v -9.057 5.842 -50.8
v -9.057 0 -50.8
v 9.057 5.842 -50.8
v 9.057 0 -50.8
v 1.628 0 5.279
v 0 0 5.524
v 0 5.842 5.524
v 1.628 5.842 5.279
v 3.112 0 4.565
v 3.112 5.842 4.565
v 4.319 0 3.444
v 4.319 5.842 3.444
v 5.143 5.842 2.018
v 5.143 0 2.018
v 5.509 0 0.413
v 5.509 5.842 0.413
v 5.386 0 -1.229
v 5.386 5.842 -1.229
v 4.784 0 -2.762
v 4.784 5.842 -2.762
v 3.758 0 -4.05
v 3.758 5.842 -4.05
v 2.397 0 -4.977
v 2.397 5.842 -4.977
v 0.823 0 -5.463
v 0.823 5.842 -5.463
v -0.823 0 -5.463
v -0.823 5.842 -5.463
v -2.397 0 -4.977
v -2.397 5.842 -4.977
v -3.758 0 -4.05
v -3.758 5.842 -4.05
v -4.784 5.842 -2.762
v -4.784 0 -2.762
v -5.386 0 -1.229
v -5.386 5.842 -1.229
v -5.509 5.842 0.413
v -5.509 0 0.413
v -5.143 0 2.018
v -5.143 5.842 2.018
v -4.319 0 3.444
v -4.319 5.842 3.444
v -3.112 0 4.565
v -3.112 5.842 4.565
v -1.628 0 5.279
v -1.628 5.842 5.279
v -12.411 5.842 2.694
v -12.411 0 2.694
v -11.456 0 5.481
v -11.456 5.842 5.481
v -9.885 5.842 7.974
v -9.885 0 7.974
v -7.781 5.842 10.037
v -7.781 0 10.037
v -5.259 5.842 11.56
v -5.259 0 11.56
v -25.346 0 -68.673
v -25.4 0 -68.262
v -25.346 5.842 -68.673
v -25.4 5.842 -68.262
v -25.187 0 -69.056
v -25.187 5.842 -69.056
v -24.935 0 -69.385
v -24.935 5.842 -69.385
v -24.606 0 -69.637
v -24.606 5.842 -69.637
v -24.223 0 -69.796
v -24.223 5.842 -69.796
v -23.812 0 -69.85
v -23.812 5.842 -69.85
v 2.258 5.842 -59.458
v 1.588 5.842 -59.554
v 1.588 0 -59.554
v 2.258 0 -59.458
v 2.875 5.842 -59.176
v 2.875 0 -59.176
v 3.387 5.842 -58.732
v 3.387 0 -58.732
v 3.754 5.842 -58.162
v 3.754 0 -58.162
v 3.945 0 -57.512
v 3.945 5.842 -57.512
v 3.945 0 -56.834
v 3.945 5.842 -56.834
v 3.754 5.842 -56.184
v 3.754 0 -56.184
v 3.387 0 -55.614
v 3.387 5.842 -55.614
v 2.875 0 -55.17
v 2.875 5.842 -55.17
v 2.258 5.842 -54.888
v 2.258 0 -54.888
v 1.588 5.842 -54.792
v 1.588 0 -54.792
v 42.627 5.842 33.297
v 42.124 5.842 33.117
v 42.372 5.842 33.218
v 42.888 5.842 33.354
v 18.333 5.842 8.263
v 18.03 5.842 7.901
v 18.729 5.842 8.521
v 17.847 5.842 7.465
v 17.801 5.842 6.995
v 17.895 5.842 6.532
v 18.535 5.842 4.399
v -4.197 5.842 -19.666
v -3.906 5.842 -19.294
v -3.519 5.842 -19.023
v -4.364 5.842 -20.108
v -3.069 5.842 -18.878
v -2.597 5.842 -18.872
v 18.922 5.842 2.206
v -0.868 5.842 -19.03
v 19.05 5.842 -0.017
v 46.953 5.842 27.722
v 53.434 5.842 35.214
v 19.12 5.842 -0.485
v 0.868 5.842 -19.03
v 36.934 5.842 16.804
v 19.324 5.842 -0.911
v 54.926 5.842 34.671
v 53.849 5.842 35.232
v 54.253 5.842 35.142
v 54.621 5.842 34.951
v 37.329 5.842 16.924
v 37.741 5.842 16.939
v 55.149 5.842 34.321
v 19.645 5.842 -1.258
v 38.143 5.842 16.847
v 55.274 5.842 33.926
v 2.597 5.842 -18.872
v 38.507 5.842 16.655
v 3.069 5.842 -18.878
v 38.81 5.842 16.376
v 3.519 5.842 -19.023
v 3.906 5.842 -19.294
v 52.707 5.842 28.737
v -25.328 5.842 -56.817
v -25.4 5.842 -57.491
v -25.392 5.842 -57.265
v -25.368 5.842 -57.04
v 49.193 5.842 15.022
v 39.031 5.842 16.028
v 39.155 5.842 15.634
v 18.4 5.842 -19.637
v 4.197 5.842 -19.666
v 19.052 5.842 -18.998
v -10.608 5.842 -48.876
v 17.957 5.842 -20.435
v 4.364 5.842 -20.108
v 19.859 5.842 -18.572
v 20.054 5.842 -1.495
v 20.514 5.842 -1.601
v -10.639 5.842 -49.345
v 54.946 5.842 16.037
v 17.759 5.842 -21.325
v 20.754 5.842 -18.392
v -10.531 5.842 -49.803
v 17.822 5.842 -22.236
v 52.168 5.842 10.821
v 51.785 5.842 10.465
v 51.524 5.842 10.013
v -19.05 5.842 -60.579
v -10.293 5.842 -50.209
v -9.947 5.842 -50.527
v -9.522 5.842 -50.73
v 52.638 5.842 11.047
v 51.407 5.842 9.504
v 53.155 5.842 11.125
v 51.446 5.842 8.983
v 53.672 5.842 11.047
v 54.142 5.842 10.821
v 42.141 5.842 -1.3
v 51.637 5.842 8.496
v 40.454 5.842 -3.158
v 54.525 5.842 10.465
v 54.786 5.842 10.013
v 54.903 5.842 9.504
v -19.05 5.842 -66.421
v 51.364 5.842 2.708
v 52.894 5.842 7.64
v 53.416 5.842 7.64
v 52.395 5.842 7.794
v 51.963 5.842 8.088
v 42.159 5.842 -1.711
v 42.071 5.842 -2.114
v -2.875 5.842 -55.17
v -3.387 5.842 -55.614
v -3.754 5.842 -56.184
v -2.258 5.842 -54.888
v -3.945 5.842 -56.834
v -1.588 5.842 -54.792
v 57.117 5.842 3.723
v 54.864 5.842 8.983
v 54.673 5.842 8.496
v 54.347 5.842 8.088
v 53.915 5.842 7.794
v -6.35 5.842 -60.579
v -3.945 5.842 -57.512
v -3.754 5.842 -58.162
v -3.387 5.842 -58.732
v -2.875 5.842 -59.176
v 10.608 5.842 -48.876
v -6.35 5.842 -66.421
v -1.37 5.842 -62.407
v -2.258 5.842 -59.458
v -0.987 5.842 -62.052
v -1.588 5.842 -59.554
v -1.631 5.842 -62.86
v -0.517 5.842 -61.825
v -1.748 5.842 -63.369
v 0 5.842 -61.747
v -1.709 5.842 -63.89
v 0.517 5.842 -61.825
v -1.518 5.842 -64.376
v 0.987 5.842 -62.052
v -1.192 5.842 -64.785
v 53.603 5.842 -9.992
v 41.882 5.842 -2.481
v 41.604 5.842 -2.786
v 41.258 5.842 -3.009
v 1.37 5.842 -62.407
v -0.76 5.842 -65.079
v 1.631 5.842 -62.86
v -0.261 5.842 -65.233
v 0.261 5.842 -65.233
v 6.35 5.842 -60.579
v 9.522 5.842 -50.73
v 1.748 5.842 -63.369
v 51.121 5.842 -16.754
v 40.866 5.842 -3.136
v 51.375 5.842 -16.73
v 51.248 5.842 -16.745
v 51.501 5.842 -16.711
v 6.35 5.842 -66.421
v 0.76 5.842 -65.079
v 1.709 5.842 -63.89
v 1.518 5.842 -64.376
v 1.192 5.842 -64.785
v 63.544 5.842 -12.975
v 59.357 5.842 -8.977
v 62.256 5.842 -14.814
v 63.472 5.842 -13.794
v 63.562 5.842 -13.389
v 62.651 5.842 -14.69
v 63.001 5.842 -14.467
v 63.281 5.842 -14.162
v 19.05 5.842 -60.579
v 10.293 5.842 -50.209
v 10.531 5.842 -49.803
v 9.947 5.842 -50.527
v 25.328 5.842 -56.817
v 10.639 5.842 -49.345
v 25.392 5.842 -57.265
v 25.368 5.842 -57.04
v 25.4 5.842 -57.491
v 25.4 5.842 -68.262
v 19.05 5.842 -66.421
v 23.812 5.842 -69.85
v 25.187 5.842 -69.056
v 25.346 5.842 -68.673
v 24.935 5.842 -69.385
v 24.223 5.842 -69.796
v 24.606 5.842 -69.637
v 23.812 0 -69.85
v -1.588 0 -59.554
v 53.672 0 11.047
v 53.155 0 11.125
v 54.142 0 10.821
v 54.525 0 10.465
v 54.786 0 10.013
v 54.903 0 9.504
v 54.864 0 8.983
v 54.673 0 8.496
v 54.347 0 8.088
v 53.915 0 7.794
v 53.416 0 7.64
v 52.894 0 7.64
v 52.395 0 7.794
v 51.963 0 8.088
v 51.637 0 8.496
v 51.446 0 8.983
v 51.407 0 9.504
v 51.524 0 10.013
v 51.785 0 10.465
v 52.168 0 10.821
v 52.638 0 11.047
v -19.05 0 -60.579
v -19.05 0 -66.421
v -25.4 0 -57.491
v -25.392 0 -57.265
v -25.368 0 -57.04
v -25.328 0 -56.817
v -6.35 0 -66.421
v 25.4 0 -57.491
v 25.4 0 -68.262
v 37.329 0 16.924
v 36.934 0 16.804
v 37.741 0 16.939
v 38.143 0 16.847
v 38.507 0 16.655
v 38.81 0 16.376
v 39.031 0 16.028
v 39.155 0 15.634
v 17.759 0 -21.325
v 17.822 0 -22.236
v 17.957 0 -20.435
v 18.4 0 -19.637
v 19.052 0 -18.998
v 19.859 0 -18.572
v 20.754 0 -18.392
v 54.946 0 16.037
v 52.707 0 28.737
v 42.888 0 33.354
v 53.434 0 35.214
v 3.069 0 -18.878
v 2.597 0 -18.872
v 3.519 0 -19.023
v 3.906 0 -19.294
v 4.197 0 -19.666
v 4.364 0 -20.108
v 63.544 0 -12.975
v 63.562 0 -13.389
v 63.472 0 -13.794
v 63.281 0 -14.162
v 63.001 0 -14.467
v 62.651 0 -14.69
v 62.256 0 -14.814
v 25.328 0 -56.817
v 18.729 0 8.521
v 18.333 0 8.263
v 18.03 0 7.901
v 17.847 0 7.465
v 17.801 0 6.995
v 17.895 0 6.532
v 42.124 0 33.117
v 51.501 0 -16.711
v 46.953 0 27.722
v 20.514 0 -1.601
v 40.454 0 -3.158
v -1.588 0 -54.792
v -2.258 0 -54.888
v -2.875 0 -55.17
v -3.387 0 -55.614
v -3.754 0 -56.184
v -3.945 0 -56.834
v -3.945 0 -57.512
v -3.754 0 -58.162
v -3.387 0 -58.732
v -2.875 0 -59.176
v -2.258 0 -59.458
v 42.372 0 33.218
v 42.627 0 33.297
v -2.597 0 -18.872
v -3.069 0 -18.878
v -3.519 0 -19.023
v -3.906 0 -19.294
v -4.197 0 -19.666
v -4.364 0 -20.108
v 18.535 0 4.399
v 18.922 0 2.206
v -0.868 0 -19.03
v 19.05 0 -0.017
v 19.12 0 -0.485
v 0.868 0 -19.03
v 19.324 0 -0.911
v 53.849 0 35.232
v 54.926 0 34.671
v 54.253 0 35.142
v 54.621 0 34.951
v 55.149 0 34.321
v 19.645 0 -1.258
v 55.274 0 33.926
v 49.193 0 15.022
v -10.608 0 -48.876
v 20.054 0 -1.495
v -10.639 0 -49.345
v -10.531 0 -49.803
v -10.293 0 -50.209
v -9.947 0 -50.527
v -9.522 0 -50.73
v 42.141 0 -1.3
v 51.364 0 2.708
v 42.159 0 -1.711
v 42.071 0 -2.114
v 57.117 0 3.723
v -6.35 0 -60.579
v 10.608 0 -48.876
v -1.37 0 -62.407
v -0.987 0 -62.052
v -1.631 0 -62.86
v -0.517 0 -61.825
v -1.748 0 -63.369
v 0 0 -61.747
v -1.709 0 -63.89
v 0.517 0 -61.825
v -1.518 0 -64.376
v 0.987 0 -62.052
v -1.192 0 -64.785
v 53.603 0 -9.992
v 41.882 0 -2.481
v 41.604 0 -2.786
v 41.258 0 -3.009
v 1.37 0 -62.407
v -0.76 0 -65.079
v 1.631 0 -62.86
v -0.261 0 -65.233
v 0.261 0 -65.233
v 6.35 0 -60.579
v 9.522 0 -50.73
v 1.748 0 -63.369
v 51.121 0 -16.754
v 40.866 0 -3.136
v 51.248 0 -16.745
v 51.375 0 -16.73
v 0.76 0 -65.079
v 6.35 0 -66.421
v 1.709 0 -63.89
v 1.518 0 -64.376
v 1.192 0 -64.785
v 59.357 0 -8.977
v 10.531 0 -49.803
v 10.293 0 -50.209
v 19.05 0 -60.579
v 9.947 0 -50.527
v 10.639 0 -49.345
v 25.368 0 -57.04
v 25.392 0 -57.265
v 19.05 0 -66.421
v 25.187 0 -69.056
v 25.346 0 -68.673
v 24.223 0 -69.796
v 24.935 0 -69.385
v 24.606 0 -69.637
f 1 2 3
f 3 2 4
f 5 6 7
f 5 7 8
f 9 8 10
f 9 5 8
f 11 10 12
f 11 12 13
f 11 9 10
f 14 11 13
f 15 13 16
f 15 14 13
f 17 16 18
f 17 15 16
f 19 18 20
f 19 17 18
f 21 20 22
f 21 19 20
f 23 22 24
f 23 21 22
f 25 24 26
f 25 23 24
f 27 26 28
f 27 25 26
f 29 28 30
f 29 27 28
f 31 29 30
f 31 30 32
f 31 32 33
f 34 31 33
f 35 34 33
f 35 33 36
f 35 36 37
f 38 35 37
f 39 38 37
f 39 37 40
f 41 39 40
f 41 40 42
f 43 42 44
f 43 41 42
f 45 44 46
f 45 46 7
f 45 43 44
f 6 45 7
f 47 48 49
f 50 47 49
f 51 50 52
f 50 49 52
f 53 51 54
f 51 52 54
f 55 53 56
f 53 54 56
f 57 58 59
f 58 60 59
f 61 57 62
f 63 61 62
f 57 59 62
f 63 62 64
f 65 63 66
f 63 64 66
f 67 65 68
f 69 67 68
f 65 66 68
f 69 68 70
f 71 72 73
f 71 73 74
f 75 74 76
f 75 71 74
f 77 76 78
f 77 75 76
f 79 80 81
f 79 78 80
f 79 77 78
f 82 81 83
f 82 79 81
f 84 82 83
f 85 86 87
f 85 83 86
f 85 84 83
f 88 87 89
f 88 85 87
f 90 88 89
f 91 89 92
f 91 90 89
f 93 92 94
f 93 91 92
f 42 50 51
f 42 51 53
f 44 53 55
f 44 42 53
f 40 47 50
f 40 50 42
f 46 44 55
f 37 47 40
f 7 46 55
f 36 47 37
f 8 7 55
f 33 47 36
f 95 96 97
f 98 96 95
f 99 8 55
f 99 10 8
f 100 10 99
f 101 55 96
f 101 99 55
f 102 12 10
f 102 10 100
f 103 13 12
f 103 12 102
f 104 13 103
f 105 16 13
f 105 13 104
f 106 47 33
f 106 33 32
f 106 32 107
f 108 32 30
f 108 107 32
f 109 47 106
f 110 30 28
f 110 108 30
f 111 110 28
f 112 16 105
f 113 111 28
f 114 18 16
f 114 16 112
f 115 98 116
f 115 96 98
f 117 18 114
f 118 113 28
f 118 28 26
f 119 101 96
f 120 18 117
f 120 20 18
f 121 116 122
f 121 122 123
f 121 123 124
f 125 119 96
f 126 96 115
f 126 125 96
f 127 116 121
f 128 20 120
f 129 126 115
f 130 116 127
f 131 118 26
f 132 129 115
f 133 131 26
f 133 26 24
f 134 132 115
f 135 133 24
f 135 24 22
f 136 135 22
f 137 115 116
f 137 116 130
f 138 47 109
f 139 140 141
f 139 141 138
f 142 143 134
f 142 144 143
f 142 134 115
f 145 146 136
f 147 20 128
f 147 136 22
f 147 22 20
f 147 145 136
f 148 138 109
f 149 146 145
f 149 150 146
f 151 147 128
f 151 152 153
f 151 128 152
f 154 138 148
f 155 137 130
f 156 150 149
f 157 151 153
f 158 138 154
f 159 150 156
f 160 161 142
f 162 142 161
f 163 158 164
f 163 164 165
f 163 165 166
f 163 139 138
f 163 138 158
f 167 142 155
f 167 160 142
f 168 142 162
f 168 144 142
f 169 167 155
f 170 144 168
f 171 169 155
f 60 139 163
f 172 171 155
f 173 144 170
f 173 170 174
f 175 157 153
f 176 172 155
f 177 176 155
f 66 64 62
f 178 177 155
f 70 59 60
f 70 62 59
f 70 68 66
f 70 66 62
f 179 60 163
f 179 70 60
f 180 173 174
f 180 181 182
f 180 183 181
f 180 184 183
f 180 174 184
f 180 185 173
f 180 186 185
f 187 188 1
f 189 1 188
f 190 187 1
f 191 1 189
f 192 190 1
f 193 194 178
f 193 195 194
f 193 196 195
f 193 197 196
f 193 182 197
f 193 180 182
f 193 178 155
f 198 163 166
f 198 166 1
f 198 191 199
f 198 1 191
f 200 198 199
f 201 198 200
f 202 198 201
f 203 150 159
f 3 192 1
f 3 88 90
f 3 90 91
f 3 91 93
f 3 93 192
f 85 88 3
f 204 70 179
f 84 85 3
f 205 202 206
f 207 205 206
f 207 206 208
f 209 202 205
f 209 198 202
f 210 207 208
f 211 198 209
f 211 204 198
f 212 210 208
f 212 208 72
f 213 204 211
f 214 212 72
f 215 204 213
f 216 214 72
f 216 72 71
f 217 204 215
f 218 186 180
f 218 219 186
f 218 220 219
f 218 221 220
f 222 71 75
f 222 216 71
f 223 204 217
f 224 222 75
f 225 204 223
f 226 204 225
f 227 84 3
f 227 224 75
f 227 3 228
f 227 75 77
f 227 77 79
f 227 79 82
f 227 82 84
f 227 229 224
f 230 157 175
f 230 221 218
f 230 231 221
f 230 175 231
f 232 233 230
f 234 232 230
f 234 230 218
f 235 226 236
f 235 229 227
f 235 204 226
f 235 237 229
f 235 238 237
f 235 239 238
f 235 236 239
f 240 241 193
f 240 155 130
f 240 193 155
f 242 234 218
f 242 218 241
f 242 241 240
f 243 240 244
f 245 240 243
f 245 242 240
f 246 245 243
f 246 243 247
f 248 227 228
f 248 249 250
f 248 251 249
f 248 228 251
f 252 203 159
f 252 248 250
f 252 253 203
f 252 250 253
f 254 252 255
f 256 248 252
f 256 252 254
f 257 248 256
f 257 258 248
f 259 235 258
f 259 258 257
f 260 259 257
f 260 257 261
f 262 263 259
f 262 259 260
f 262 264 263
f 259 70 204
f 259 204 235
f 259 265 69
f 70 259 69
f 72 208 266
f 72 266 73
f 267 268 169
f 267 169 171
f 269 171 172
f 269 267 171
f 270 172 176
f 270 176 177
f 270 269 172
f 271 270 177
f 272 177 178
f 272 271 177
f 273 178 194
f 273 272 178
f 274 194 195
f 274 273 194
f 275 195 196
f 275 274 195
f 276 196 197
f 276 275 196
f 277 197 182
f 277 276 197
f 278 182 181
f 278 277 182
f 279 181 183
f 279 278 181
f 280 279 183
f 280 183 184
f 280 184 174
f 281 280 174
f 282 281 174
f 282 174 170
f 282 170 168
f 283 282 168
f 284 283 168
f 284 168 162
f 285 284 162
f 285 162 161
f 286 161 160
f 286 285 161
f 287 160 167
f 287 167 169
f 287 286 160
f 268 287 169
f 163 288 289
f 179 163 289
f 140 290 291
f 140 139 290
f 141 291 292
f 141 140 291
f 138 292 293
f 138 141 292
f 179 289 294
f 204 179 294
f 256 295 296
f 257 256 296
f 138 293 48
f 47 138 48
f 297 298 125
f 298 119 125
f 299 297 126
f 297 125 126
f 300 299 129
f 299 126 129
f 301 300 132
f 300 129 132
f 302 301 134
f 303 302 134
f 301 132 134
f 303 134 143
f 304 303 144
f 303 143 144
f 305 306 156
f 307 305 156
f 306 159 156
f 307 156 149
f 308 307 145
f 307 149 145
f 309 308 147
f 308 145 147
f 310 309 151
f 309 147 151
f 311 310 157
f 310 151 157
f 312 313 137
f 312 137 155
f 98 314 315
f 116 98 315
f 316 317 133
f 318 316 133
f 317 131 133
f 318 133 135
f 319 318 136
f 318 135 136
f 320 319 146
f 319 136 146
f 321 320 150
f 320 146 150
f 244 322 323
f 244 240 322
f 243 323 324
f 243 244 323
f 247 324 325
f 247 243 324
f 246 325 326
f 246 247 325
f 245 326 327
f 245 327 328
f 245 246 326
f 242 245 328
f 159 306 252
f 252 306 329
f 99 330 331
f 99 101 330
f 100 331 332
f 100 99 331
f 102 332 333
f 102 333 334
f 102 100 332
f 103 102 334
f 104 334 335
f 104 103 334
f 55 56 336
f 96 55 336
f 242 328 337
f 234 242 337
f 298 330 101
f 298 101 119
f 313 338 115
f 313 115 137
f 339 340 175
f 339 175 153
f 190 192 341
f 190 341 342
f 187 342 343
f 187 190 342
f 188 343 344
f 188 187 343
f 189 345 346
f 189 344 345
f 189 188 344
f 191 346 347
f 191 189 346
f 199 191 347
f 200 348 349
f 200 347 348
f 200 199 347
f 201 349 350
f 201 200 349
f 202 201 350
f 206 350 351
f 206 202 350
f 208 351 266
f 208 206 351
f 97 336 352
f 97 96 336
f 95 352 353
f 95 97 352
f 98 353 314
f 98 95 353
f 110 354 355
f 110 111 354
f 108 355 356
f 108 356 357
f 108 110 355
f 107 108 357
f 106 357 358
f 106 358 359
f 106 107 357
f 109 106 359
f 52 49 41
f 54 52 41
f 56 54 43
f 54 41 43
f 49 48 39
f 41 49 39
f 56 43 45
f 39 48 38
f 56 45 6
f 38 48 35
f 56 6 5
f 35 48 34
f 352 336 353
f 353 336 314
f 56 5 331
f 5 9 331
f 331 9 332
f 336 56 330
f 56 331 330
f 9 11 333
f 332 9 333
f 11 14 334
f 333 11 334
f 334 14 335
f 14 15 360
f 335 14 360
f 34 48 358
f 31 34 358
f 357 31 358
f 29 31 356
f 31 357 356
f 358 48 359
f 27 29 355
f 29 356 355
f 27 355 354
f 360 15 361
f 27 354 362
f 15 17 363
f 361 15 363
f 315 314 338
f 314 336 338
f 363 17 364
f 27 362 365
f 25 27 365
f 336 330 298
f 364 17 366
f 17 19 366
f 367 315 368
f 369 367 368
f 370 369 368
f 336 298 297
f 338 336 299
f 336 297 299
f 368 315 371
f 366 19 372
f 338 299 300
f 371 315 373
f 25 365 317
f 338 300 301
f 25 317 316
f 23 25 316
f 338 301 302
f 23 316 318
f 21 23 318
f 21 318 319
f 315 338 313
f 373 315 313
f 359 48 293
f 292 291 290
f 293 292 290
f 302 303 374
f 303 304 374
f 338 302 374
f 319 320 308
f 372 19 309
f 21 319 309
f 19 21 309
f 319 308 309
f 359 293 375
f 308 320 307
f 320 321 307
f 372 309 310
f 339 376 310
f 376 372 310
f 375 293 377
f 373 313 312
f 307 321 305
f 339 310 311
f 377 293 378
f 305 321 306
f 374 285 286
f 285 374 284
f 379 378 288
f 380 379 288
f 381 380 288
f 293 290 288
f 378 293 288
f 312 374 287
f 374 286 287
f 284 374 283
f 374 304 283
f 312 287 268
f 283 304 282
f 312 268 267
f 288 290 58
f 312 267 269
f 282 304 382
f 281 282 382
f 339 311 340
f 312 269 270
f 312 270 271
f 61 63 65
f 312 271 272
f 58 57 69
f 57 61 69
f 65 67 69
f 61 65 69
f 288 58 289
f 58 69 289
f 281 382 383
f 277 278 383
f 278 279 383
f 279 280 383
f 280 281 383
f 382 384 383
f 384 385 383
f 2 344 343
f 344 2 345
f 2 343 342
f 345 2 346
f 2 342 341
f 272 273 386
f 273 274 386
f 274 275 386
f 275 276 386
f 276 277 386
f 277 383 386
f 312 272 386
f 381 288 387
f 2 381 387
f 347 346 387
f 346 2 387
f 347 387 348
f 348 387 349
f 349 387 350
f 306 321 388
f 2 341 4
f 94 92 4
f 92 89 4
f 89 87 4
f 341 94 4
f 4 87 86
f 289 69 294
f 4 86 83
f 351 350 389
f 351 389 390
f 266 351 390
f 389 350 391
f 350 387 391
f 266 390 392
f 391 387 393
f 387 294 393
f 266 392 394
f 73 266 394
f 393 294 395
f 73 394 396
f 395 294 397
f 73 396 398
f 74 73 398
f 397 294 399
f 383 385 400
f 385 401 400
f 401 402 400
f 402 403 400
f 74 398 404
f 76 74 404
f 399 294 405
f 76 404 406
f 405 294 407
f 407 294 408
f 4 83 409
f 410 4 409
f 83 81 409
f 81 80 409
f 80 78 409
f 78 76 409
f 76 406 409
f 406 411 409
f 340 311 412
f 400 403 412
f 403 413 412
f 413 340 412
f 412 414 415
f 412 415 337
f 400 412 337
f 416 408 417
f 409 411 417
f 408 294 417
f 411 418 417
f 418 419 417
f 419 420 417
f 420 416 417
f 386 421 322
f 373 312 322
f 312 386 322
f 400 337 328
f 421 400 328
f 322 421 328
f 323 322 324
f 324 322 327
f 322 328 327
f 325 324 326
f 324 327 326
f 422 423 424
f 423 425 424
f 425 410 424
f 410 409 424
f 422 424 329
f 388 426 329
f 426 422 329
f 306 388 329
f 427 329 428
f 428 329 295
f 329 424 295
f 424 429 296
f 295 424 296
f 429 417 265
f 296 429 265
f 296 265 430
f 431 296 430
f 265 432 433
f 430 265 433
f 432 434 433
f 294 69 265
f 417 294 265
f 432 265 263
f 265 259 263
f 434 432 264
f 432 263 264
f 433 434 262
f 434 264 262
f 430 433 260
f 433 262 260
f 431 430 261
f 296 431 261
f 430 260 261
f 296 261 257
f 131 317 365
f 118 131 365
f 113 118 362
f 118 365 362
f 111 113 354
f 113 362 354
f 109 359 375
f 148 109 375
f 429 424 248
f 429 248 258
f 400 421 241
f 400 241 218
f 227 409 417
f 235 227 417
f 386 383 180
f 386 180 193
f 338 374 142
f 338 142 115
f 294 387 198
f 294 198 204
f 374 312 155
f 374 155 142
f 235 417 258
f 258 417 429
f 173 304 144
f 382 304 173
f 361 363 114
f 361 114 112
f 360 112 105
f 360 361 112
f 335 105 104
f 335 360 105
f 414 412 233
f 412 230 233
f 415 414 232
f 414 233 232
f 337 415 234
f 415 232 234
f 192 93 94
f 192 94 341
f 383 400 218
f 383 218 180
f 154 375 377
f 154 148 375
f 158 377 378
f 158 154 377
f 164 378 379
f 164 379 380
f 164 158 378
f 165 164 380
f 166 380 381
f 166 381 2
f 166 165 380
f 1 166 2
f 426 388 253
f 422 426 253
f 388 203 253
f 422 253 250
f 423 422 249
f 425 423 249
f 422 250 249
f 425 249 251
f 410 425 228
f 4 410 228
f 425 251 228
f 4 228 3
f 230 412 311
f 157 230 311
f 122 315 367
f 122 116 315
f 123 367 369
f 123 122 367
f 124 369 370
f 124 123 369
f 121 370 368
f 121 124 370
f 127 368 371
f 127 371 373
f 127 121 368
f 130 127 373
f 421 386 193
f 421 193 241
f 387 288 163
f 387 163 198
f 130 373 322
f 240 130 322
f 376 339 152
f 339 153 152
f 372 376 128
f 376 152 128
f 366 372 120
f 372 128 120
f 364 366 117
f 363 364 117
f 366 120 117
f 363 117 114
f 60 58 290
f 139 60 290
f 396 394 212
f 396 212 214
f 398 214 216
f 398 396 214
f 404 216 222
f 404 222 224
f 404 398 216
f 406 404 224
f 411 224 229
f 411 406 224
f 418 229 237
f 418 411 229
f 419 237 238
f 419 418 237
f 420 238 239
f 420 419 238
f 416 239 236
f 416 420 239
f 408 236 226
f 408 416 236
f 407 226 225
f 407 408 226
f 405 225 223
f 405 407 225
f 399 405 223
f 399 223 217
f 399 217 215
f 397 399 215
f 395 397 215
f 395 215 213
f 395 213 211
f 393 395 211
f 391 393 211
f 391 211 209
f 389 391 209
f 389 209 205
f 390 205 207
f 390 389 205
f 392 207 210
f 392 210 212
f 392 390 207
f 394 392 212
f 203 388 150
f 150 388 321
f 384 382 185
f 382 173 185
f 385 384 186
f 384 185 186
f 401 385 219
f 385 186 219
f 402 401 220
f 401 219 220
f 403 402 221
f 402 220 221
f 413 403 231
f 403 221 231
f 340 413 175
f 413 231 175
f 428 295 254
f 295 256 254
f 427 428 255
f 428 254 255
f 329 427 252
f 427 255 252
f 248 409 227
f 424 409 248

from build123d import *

# Parameters (mm, degrees)
SKETCH1_R           = 5.5245
SKETCH1_R_2         = 1.7526
SKETCH1_W           = 12.7
SKETCH1_H           = 5.842
BOSS_EXTRUDE1_DEPTH = 5.842
FILLET1_R           = 1.5875
FILLET2_R           = 1.5875
FILLET3_R           = 3.175
CUT_EXTRUDE3_DEPTH  = 95.62556025


with BuildPart() as part:
    # Sketch1 → Boss-Extrude1 (new body)
    with BuildSketch(Plane(origin=(0, 0, 0), x_dir=(1, 0, 0), z_dir=(0, 1, 0))):
        with BuildLine():
            Line((-25.4, 57.15), (-12.411023526, -2.693788234))
            ThreePointArc((-12.411023526, -2.693788234), (-9.884908198, -7.97361837), (-5.259246403, -11.559858445))
            Line((-5.259246403, -11.559858445), (42.490805524, -33.284111388))
            Line((42.490805524, -33.284111388), (54.997863988, -35.489443244))
            Line((54.997863988, -35.489443244), (63.819191413, 14.538790609))
            Line((63.819191413, 14.538790609), (51.31213295, 16.744122465))
            Line((51.31213295, 16.744122465), (17.03122895, 18.5927693))
            Line((17.03122895, 18.5927693), (25.4, 57.15))
            Line((25.4, 57.15), (25.4, 69.85))
            Line((25.4, 69.85), (-25.4, 69.85))
            Line((-25.4, 69.85), (-25.4, 57.15))
        make_face()
        with Locations(Location((0, 0, 0), (0, 0, 270))):
            Circle(SKETCH1_R, mode=Mode.SUBTRACT)
        with Locations(Location((0, 63.5, 0), (0, 0, 270))):
            Circle(SKETCH1_R_2, mode=Mode.SUBTRACT)
        with Locations(Location((53.154998469, -9.37266039, 0), (0, 0, 270))):
            Circle(SKETCH1_R_2, mode=Mode.SUBTRACT)
        with Locations((-12.7, 63.5)):
            Rectangle(SKETCH1_W, SKETCH1_H, mode=Mode.SUBTRACT)
        with Locations((12.7, 63.5)):
            Rectangle(SKETCH1_W, SKETCH1_H, mode=Mode.SUBTRACT)
        Polygon((53.603383206, 9.991624401), (51.364030551, -2.708375599), (57.117277444, -3.722828253), (59.356630099, 8.977171747), align=None, mode=Mode.SUBTRACT)
        Polygon((52.706613732, -28.73694518), (54.945966387, -16.03694518), (49.192719493, -15.022492526), (46.953366838, -27.722492526), align=None, mode=Mode.SUBTRACT)
        with BuildLine():
            Line((-4.04068235, 18.616535288), (-11.026040035, 50.8))
            Line((-11.026040035, 50.8), (11.026040035, 50.8))
            Line((11.026040035, 50.8), (4.04068235, 18.616535288))
            ThreePointArc((4.04068235, 18.616535288), (0, 19.05), (-4.04068235, 18.616535288))
        make_face(mode=Mode.SUBTRACT)
        with BuildLine():
            Line((17.339787668, -7.888869605), (38.799209797, -17.651998555))
            Line((38.799209797, -17.651998555), (42.496670214, 3.317341488))
            Line((42.496670214, 3.317341488), (18.99222283, 1.48255589))
            ThreePointArc((18.99222283, 1.48255589), (18.760587695, -3.307997785), (17.339787668, -7.888869605))
        make_face(mode=Mode.SUBTRACT)
    extrude(amount=BOSS_EXTRUDE1_DEPTH)

    # Fillet1
    fillet1_edges = [part.edges().sort_by_distance(p)[0] for p in [
        (18.99222283, 2.921, -1.48255589),
        (17.339787668, 2.921, 7.888869605),
        (38.799209797, 2.921, 17.651998555),
        (42.496670214, 2.921, -3.317341488),
        (-4.04068235, 2.921, -18.616535288),
        (4.04068235, 2.921, -18.616535288),
        (11.026040035, 2.921, -50.8),
        (-11.026040035, 2.921, -50.8),
    ]]
    fillet(fillet1_edges, radius=FILLET1_R)

    # Fillet2
    fillet2_edges = [part.edges().sort_by_distance(p)[0] for p in [
        (-25.4, 2.921, -69.85),
        (25.4, 2.921, -69.85),
        (63.819191413, 2.921, -14.538790609),
        (54.997863988, 2.921, 35.489443244),
    ]]
    fillet(fillet2_edges, radius=FILLET2_R)

    # Fillet3
    fillet3_edges = [part.edges().sort_by_distance(p)[0] for p in [
        (25.4, 2.921, -57.15),
        (17.03122895, 2.921, -18.5927693),
        (51.31213295, 2.921, -16.744122465),
        (42.490805524, 2.921, 33.284111388),
        (-25.4, 2.921, -57.15),
    ]]
    fillet(fillet3_edges, radius=FILLET3_R)

    # Sketch2 → Cut-Extrude3 (cut, through all)
    with BuildSketch(Plane(origin=(0, 5.842, 0), x_dir=(1, 0, 0), z_dir=(0, 1, 0))):
        with BuildLine():
            Line((1.5875, 54.791775853), (-1.5875, 54.791775853))
            ThreePointArc((-1.5875, 54.791775853), (-3.96875, 57.173025853), (-1.5875, 59.554275853))
            Line((-1.5875, 59.554275853), (1.5875, 59.554275853))
            ThreePointArc((1.5875, 59.554275853), (3.96875, 57.173025853), (1.5875, 54.791775853))
        make_face()
    extrude(amount=-CUT_EXTRUDE3_DEPTH, mode=Mode.SUBTRACT)


solid = part.part
